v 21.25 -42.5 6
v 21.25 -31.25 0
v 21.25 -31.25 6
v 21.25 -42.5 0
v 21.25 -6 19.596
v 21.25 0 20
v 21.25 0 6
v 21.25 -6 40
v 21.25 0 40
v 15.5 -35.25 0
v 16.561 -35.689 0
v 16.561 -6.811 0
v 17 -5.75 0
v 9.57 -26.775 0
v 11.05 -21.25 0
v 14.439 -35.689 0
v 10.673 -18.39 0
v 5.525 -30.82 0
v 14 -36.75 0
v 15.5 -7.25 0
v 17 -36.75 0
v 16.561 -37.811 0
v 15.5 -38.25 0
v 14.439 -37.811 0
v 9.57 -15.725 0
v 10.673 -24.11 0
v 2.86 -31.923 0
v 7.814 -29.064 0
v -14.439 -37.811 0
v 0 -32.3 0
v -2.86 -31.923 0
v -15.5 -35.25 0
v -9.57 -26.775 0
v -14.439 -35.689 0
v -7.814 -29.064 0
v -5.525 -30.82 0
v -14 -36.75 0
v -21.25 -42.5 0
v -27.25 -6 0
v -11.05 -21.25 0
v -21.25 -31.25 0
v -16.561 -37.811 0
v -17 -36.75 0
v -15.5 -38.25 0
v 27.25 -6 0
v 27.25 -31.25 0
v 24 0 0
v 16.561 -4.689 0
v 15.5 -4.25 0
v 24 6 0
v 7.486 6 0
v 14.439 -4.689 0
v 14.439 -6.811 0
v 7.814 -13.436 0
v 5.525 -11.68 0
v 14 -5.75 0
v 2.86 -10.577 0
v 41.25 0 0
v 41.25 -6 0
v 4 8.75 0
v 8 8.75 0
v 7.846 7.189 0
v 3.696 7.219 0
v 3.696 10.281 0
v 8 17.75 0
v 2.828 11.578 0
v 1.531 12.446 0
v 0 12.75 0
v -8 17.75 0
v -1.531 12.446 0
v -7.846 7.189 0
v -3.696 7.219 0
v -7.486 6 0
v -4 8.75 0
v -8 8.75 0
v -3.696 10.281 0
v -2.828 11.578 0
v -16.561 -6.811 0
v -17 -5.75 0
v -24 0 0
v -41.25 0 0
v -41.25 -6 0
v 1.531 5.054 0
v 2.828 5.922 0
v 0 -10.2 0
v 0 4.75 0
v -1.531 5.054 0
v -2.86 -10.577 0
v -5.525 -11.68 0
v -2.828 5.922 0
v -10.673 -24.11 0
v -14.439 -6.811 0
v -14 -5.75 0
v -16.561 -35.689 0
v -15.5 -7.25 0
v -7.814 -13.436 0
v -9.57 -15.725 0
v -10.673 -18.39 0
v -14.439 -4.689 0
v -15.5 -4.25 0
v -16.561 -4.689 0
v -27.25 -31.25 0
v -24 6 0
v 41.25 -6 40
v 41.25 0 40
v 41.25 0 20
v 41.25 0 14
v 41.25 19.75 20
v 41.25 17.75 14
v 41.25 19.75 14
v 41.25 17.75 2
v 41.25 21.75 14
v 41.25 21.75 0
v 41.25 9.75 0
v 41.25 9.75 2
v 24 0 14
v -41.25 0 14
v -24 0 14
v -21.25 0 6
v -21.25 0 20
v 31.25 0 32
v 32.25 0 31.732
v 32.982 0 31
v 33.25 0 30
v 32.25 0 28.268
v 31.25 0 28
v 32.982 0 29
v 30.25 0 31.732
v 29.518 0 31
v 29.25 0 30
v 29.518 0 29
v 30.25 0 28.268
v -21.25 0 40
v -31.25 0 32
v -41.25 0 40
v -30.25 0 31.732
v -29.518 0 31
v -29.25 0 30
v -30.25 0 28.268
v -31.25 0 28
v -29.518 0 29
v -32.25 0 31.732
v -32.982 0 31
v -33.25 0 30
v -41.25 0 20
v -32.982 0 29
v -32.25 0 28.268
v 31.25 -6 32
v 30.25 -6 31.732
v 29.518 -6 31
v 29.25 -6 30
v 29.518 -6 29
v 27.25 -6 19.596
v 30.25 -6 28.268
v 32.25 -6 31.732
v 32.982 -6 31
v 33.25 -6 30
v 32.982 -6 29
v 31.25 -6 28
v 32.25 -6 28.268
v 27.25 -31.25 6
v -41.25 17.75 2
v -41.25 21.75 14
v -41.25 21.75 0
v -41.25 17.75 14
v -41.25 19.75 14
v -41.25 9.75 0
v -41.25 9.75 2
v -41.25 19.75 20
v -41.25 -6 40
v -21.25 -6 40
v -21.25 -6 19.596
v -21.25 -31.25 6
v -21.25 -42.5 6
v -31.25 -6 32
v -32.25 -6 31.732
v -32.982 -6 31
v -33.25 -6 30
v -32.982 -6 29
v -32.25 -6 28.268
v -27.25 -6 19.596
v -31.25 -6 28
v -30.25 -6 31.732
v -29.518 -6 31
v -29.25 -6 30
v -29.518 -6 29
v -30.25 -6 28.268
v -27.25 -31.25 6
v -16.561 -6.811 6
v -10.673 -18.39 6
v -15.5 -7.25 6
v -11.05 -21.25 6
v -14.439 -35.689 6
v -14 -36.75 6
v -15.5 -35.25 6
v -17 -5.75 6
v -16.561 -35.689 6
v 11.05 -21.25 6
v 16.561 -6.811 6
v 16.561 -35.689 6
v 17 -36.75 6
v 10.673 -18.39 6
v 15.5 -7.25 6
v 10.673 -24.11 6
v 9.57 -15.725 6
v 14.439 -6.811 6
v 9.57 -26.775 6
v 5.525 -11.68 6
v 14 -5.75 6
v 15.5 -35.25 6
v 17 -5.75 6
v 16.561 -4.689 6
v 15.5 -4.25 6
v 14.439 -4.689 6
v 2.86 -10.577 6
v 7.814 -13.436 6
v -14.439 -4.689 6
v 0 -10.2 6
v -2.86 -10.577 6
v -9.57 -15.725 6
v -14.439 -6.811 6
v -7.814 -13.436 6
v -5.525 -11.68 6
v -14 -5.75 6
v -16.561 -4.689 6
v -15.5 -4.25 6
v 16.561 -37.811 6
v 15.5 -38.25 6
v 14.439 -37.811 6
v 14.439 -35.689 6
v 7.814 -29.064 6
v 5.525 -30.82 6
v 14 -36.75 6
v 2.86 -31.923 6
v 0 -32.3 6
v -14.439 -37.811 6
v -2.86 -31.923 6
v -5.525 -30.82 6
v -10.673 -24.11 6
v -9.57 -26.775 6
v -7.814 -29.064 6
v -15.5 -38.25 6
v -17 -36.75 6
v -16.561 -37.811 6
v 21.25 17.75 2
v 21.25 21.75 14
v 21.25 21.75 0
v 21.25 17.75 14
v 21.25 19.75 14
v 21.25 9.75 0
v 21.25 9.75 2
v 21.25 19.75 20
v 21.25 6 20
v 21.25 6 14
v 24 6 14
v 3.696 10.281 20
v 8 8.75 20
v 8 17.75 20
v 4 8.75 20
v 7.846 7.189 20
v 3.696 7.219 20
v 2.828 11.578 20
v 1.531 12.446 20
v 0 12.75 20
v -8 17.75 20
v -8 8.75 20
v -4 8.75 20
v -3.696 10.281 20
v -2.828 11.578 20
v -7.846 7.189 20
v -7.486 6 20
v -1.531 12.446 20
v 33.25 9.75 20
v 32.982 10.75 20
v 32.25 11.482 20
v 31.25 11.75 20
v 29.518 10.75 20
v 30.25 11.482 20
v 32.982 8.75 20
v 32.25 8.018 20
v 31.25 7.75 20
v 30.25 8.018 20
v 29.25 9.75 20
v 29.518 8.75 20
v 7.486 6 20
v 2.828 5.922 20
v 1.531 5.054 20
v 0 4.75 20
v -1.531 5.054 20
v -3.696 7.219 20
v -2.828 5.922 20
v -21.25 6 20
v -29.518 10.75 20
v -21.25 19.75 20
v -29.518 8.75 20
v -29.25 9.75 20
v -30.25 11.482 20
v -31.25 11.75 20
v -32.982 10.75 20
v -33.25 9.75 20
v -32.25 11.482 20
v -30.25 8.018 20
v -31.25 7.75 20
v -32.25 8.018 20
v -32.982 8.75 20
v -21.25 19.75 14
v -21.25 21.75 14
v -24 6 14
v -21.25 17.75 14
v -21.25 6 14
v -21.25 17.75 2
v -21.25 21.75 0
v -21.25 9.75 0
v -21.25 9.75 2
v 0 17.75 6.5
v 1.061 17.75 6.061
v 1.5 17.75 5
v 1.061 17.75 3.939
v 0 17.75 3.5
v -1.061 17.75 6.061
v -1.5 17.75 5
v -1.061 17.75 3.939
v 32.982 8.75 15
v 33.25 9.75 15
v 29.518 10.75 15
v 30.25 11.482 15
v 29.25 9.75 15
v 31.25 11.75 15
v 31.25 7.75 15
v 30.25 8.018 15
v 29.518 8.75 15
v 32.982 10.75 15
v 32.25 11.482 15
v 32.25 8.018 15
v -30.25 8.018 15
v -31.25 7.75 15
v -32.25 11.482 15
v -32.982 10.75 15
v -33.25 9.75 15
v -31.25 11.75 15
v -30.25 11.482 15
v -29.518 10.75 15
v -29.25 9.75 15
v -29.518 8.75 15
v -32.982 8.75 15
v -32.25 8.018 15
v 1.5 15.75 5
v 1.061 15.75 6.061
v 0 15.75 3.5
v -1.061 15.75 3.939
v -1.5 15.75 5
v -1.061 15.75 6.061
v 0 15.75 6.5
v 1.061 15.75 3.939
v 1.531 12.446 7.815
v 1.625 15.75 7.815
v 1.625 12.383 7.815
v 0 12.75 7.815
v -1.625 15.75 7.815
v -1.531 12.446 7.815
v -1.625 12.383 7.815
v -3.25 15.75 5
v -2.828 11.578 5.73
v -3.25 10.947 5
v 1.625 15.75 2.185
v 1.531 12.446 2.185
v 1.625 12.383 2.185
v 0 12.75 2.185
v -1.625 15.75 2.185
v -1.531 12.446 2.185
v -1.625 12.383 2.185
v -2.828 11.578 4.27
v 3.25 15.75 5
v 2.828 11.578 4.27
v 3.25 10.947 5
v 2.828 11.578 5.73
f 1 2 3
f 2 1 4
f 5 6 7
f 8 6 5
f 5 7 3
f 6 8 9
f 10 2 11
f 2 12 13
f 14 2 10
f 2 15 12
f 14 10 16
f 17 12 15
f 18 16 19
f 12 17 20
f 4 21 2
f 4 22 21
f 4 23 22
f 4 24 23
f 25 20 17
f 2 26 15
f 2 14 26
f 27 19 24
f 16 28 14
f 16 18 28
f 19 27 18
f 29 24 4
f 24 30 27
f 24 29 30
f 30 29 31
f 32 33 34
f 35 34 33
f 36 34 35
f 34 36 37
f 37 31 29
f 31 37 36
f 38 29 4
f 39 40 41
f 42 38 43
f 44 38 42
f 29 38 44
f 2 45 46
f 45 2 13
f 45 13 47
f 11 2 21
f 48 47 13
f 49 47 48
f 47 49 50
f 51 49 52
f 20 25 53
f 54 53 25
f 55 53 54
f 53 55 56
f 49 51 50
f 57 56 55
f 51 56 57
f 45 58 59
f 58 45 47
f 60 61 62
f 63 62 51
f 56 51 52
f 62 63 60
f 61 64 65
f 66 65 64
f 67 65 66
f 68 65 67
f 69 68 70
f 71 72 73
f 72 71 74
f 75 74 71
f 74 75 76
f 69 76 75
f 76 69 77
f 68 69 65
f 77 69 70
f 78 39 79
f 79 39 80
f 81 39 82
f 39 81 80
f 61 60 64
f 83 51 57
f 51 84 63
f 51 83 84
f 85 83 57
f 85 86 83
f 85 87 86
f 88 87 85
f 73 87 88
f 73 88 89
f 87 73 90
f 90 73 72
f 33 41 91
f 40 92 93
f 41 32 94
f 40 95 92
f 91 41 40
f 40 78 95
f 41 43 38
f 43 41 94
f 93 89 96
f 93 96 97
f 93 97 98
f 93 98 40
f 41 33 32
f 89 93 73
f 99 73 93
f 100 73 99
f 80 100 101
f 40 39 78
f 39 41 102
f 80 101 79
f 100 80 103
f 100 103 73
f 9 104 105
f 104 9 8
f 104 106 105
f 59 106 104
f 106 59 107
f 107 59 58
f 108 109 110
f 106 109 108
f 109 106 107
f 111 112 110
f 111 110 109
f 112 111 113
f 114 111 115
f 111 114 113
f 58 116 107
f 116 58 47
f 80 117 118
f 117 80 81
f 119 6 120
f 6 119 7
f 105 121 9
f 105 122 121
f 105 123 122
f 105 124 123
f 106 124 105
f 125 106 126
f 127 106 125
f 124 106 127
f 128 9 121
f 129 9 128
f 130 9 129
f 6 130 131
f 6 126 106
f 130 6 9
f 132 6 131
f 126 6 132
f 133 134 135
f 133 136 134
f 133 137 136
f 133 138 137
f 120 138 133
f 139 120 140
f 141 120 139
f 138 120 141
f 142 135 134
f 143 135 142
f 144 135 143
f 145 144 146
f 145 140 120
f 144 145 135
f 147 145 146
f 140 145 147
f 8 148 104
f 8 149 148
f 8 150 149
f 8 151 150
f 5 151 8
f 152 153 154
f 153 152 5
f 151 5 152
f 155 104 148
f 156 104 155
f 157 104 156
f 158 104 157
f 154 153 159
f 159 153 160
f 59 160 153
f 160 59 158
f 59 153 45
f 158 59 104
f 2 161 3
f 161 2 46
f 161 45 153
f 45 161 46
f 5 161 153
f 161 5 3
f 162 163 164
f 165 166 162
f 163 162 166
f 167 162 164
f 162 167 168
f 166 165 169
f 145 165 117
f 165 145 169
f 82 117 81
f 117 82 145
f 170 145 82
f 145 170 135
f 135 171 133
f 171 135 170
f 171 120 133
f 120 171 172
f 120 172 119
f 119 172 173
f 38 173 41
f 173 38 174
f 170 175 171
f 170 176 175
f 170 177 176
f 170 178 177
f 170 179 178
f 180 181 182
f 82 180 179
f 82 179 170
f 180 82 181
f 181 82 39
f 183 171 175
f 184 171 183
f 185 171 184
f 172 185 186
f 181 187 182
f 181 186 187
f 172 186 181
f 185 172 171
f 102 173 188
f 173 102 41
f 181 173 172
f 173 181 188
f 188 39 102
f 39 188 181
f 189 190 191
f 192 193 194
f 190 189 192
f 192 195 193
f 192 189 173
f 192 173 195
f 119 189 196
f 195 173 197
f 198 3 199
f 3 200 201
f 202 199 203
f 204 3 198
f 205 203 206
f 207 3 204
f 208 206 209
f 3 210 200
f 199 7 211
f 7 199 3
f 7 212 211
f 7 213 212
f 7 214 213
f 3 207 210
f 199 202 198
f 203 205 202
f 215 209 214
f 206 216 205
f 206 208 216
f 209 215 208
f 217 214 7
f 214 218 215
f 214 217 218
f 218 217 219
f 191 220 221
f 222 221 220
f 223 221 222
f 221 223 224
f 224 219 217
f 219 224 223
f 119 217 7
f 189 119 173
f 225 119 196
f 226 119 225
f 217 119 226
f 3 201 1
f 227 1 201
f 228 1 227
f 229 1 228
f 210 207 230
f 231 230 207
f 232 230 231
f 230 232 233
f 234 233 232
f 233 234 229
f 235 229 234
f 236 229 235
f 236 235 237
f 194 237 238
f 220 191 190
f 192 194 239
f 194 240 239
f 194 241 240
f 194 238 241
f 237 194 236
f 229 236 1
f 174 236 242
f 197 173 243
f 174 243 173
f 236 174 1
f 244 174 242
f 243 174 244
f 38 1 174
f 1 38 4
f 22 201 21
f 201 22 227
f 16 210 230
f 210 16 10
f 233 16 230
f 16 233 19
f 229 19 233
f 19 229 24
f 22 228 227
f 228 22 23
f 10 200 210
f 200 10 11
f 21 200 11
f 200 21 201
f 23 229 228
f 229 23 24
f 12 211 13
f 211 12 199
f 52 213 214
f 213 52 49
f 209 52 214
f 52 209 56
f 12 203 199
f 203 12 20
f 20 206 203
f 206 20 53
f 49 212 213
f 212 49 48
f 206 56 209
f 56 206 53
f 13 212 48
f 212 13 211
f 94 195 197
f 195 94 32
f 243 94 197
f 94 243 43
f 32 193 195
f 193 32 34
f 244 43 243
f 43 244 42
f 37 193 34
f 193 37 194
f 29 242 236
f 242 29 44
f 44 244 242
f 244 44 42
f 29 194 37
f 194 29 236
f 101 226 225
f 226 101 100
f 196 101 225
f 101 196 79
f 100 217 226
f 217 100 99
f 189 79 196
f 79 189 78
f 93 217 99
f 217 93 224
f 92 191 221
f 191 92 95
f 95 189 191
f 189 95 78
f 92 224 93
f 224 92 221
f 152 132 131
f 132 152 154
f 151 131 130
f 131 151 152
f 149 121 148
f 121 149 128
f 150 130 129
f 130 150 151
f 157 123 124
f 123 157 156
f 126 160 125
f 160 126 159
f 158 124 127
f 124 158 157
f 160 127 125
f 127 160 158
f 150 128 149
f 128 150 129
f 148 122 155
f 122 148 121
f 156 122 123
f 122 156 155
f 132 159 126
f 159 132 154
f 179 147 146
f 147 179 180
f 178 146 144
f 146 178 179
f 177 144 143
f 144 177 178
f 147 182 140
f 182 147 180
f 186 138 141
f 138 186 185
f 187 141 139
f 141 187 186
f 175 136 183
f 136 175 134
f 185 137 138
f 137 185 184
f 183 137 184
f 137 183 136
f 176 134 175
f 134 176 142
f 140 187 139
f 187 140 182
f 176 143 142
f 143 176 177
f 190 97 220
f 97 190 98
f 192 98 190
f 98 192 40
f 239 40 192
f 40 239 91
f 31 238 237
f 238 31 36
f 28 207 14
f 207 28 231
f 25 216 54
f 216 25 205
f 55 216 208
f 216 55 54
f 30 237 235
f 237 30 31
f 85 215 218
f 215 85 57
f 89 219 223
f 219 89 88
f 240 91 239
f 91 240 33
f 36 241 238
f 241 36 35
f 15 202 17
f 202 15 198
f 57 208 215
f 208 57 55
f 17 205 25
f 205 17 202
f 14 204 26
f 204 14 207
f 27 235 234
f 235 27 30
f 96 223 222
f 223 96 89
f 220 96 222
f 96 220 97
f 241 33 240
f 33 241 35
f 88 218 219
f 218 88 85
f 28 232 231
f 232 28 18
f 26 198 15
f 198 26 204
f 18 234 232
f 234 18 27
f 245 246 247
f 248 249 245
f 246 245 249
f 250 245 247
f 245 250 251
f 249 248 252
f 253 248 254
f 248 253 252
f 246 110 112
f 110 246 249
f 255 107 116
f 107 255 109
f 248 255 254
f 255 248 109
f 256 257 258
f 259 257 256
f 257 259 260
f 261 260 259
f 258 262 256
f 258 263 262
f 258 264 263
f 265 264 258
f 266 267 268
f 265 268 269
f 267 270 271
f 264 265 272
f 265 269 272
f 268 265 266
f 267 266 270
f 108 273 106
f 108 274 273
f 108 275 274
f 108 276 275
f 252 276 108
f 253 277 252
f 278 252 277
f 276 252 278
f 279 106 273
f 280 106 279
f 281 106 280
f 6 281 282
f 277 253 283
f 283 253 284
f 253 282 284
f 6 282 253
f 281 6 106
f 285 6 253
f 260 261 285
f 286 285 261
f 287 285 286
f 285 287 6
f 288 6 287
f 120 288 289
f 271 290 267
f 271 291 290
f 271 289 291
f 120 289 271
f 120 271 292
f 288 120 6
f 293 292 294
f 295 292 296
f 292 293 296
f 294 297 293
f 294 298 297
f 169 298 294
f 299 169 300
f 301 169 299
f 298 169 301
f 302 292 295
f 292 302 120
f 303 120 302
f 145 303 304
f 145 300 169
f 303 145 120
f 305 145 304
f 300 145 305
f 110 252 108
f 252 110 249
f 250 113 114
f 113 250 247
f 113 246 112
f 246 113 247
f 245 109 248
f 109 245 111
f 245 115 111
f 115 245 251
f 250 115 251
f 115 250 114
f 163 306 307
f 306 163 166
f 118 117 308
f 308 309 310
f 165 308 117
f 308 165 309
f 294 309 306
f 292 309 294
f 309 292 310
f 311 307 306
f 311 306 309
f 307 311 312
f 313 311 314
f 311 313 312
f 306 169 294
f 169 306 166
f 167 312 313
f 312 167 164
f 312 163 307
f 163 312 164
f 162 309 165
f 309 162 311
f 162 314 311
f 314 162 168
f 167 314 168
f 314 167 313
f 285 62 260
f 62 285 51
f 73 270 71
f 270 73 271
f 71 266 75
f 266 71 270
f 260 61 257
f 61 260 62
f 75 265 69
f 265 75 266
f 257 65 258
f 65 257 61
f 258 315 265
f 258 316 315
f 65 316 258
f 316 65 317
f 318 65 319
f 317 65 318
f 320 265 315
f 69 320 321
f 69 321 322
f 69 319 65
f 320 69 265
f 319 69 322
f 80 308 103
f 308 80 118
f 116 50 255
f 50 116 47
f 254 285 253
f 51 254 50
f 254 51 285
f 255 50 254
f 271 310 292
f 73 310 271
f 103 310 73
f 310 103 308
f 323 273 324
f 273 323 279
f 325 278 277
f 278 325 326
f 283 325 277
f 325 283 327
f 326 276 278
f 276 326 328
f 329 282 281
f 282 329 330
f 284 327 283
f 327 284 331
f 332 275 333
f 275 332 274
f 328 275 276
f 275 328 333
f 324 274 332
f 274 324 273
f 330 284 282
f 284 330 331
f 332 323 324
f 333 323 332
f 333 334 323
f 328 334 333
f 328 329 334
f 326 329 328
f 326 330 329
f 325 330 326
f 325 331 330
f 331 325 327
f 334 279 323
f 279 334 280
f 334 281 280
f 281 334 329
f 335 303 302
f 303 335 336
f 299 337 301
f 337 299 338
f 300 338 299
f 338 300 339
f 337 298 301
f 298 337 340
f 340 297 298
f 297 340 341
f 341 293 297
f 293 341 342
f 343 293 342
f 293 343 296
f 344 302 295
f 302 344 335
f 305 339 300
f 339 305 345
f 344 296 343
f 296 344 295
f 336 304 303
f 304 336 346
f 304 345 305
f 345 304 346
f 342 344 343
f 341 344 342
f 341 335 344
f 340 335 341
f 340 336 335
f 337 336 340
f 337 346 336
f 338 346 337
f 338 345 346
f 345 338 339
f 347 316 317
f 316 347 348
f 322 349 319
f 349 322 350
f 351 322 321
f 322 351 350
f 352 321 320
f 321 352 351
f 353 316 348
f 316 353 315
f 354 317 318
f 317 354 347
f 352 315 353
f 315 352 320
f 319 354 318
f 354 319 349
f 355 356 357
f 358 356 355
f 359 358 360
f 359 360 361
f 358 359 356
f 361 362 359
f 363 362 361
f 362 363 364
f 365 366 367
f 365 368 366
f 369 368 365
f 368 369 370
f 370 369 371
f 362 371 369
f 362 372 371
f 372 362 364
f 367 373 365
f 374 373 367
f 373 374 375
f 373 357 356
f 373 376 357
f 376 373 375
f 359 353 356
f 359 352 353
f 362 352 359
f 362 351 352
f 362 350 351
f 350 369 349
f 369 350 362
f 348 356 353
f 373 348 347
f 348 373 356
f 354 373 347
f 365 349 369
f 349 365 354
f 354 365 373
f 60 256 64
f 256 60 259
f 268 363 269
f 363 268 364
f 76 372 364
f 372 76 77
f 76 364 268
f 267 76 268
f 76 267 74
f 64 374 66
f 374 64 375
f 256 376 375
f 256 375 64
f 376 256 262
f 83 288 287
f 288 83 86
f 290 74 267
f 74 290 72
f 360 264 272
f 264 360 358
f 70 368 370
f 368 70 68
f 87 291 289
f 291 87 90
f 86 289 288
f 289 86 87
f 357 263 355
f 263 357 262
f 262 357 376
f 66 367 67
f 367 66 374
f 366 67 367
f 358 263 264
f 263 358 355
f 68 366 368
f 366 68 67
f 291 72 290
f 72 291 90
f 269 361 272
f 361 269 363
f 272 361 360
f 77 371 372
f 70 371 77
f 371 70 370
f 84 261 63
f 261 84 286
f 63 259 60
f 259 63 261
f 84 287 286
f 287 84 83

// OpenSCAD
module motor() {
difference() {
    union() {
        translate( [0,0,3] ) cube( size=[42.5,42.5,6], center=true);
        for( x = [ -1, 1 ] ) {
            translate( [x*31.25,18.25,-14] ) cube( size=[20,6,40], center=true );
            translate( [x* 24.25 ,10,-4] )
                rotate( [0,-90,0] ) linear_extrude(height = 6, center=true ) 
                    polygon( points=[ [-10,6], [10,6], [10,-20], [4,-20] ] );
        }
    }
    for( x = [ -15.5, 15.5 ] ) {
        for( y = [ -15.5, 15.5 ] ) {
            translate( [x,y,-1] ) cylinder( r = 1.5, h = 8, $fn=8 );
        }
    }
    for( x = [ -31.25, 31.25 ] )  {
        translate( [x,22,-24] ) 
              rotate( [90,0,0] ) cylinder( r = 2, h = 8, $fn = 12 );
    }

    translate( [0,0,-1] ) cylinder( r = 11.05, h = 8, $fn=24 );
}
}

module rod() {
    difference() {
        union() {
            cylinder( r = 8, h = 20, $fn = 32 );
            translate( [-8, 0,0] ) cube( size=[ 16, 9, 20 ] );
            translate( [0,-5.75, 10 ] ) cube( size = [ 48, 6, 20 ], center = true );
            for( x = [ -1, 1 ] )  {
                translate( [x*31.25,1, 3 ] ) cube( size = [ 20, 20, 6 ], center = true );
                translate( [x*31.25,11, 13 ] ) cube( size = [ 20, 4, 14 ], center = true );
                translate( [x*31.25,6, 19 ] ) cube( size = [ 20, 10, 2 ], center = true );
            }
        }
        translate( [0, 0,-1] ) cylinder( r = 4, h = 22, $fn = 16 );
        for( x = [ -1, 1 ] ) 
             translate( [x*31.25,1, -1 ] ) cylinder( r = 2, h = 6, $fn = 12 );

        translate( [0,10,15] )  
              rotate( [90,0,0] )  { 
                  cylinder( r = 1.5, h = 8, $fn = 8 );
                  translate( [0,0,3] ) cylinder( r = 3.25, h = 5, $fn = 6 );
        }
    }
}

translate( [0,0,20] )
rotate( [0,180,0] ) {
translate( [0, -21.25,14] ) motor();
translate( [0, 30-21.25,0] ) rod();
}
